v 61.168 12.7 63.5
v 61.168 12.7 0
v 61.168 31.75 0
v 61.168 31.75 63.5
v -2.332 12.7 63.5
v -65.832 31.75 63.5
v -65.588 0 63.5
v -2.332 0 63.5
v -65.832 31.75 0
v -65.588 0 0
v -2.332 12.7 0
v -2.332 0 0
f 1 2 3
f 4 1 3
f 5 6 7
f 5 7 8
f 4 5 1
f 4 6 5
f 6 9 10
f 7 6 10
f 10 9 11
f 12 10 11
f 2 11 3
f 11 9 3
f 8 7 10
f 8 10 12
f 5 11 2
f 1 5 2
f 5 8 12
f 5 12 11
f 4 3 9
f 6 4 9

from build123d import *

# Parameters (mm, degrees)
F1_DEPTH = 63.5
F2_DEPTH = 63.5


with BuildPart() as f1:
    # F0 (on Top) → F1 (new body)
    with BuildSketch(Plane.XY):
        Polygon((61.167741, 31.75), (-65.832259, 31.75), (-65.58761, 0), (-2.332259, 0), (-2.332259, 12.7), (15.4492, 12.7), (61.167741, 12.7), align=None)
    extrude(amount=F1_DEPTH)

    # F0 (on Top) → F2 (join)
    with BuildSketch(Plane.XY):
        Polygon((61.167741, 31.75), (-65.832259, 31.75), (-65.58761, 0), (-2.332259, 0), (-2.332259, 12.7), (15.4492, 12.7), (61.167741, 12.7), align=None)
    extrude(amount=F2_DEPTH)


solid = f1.part
